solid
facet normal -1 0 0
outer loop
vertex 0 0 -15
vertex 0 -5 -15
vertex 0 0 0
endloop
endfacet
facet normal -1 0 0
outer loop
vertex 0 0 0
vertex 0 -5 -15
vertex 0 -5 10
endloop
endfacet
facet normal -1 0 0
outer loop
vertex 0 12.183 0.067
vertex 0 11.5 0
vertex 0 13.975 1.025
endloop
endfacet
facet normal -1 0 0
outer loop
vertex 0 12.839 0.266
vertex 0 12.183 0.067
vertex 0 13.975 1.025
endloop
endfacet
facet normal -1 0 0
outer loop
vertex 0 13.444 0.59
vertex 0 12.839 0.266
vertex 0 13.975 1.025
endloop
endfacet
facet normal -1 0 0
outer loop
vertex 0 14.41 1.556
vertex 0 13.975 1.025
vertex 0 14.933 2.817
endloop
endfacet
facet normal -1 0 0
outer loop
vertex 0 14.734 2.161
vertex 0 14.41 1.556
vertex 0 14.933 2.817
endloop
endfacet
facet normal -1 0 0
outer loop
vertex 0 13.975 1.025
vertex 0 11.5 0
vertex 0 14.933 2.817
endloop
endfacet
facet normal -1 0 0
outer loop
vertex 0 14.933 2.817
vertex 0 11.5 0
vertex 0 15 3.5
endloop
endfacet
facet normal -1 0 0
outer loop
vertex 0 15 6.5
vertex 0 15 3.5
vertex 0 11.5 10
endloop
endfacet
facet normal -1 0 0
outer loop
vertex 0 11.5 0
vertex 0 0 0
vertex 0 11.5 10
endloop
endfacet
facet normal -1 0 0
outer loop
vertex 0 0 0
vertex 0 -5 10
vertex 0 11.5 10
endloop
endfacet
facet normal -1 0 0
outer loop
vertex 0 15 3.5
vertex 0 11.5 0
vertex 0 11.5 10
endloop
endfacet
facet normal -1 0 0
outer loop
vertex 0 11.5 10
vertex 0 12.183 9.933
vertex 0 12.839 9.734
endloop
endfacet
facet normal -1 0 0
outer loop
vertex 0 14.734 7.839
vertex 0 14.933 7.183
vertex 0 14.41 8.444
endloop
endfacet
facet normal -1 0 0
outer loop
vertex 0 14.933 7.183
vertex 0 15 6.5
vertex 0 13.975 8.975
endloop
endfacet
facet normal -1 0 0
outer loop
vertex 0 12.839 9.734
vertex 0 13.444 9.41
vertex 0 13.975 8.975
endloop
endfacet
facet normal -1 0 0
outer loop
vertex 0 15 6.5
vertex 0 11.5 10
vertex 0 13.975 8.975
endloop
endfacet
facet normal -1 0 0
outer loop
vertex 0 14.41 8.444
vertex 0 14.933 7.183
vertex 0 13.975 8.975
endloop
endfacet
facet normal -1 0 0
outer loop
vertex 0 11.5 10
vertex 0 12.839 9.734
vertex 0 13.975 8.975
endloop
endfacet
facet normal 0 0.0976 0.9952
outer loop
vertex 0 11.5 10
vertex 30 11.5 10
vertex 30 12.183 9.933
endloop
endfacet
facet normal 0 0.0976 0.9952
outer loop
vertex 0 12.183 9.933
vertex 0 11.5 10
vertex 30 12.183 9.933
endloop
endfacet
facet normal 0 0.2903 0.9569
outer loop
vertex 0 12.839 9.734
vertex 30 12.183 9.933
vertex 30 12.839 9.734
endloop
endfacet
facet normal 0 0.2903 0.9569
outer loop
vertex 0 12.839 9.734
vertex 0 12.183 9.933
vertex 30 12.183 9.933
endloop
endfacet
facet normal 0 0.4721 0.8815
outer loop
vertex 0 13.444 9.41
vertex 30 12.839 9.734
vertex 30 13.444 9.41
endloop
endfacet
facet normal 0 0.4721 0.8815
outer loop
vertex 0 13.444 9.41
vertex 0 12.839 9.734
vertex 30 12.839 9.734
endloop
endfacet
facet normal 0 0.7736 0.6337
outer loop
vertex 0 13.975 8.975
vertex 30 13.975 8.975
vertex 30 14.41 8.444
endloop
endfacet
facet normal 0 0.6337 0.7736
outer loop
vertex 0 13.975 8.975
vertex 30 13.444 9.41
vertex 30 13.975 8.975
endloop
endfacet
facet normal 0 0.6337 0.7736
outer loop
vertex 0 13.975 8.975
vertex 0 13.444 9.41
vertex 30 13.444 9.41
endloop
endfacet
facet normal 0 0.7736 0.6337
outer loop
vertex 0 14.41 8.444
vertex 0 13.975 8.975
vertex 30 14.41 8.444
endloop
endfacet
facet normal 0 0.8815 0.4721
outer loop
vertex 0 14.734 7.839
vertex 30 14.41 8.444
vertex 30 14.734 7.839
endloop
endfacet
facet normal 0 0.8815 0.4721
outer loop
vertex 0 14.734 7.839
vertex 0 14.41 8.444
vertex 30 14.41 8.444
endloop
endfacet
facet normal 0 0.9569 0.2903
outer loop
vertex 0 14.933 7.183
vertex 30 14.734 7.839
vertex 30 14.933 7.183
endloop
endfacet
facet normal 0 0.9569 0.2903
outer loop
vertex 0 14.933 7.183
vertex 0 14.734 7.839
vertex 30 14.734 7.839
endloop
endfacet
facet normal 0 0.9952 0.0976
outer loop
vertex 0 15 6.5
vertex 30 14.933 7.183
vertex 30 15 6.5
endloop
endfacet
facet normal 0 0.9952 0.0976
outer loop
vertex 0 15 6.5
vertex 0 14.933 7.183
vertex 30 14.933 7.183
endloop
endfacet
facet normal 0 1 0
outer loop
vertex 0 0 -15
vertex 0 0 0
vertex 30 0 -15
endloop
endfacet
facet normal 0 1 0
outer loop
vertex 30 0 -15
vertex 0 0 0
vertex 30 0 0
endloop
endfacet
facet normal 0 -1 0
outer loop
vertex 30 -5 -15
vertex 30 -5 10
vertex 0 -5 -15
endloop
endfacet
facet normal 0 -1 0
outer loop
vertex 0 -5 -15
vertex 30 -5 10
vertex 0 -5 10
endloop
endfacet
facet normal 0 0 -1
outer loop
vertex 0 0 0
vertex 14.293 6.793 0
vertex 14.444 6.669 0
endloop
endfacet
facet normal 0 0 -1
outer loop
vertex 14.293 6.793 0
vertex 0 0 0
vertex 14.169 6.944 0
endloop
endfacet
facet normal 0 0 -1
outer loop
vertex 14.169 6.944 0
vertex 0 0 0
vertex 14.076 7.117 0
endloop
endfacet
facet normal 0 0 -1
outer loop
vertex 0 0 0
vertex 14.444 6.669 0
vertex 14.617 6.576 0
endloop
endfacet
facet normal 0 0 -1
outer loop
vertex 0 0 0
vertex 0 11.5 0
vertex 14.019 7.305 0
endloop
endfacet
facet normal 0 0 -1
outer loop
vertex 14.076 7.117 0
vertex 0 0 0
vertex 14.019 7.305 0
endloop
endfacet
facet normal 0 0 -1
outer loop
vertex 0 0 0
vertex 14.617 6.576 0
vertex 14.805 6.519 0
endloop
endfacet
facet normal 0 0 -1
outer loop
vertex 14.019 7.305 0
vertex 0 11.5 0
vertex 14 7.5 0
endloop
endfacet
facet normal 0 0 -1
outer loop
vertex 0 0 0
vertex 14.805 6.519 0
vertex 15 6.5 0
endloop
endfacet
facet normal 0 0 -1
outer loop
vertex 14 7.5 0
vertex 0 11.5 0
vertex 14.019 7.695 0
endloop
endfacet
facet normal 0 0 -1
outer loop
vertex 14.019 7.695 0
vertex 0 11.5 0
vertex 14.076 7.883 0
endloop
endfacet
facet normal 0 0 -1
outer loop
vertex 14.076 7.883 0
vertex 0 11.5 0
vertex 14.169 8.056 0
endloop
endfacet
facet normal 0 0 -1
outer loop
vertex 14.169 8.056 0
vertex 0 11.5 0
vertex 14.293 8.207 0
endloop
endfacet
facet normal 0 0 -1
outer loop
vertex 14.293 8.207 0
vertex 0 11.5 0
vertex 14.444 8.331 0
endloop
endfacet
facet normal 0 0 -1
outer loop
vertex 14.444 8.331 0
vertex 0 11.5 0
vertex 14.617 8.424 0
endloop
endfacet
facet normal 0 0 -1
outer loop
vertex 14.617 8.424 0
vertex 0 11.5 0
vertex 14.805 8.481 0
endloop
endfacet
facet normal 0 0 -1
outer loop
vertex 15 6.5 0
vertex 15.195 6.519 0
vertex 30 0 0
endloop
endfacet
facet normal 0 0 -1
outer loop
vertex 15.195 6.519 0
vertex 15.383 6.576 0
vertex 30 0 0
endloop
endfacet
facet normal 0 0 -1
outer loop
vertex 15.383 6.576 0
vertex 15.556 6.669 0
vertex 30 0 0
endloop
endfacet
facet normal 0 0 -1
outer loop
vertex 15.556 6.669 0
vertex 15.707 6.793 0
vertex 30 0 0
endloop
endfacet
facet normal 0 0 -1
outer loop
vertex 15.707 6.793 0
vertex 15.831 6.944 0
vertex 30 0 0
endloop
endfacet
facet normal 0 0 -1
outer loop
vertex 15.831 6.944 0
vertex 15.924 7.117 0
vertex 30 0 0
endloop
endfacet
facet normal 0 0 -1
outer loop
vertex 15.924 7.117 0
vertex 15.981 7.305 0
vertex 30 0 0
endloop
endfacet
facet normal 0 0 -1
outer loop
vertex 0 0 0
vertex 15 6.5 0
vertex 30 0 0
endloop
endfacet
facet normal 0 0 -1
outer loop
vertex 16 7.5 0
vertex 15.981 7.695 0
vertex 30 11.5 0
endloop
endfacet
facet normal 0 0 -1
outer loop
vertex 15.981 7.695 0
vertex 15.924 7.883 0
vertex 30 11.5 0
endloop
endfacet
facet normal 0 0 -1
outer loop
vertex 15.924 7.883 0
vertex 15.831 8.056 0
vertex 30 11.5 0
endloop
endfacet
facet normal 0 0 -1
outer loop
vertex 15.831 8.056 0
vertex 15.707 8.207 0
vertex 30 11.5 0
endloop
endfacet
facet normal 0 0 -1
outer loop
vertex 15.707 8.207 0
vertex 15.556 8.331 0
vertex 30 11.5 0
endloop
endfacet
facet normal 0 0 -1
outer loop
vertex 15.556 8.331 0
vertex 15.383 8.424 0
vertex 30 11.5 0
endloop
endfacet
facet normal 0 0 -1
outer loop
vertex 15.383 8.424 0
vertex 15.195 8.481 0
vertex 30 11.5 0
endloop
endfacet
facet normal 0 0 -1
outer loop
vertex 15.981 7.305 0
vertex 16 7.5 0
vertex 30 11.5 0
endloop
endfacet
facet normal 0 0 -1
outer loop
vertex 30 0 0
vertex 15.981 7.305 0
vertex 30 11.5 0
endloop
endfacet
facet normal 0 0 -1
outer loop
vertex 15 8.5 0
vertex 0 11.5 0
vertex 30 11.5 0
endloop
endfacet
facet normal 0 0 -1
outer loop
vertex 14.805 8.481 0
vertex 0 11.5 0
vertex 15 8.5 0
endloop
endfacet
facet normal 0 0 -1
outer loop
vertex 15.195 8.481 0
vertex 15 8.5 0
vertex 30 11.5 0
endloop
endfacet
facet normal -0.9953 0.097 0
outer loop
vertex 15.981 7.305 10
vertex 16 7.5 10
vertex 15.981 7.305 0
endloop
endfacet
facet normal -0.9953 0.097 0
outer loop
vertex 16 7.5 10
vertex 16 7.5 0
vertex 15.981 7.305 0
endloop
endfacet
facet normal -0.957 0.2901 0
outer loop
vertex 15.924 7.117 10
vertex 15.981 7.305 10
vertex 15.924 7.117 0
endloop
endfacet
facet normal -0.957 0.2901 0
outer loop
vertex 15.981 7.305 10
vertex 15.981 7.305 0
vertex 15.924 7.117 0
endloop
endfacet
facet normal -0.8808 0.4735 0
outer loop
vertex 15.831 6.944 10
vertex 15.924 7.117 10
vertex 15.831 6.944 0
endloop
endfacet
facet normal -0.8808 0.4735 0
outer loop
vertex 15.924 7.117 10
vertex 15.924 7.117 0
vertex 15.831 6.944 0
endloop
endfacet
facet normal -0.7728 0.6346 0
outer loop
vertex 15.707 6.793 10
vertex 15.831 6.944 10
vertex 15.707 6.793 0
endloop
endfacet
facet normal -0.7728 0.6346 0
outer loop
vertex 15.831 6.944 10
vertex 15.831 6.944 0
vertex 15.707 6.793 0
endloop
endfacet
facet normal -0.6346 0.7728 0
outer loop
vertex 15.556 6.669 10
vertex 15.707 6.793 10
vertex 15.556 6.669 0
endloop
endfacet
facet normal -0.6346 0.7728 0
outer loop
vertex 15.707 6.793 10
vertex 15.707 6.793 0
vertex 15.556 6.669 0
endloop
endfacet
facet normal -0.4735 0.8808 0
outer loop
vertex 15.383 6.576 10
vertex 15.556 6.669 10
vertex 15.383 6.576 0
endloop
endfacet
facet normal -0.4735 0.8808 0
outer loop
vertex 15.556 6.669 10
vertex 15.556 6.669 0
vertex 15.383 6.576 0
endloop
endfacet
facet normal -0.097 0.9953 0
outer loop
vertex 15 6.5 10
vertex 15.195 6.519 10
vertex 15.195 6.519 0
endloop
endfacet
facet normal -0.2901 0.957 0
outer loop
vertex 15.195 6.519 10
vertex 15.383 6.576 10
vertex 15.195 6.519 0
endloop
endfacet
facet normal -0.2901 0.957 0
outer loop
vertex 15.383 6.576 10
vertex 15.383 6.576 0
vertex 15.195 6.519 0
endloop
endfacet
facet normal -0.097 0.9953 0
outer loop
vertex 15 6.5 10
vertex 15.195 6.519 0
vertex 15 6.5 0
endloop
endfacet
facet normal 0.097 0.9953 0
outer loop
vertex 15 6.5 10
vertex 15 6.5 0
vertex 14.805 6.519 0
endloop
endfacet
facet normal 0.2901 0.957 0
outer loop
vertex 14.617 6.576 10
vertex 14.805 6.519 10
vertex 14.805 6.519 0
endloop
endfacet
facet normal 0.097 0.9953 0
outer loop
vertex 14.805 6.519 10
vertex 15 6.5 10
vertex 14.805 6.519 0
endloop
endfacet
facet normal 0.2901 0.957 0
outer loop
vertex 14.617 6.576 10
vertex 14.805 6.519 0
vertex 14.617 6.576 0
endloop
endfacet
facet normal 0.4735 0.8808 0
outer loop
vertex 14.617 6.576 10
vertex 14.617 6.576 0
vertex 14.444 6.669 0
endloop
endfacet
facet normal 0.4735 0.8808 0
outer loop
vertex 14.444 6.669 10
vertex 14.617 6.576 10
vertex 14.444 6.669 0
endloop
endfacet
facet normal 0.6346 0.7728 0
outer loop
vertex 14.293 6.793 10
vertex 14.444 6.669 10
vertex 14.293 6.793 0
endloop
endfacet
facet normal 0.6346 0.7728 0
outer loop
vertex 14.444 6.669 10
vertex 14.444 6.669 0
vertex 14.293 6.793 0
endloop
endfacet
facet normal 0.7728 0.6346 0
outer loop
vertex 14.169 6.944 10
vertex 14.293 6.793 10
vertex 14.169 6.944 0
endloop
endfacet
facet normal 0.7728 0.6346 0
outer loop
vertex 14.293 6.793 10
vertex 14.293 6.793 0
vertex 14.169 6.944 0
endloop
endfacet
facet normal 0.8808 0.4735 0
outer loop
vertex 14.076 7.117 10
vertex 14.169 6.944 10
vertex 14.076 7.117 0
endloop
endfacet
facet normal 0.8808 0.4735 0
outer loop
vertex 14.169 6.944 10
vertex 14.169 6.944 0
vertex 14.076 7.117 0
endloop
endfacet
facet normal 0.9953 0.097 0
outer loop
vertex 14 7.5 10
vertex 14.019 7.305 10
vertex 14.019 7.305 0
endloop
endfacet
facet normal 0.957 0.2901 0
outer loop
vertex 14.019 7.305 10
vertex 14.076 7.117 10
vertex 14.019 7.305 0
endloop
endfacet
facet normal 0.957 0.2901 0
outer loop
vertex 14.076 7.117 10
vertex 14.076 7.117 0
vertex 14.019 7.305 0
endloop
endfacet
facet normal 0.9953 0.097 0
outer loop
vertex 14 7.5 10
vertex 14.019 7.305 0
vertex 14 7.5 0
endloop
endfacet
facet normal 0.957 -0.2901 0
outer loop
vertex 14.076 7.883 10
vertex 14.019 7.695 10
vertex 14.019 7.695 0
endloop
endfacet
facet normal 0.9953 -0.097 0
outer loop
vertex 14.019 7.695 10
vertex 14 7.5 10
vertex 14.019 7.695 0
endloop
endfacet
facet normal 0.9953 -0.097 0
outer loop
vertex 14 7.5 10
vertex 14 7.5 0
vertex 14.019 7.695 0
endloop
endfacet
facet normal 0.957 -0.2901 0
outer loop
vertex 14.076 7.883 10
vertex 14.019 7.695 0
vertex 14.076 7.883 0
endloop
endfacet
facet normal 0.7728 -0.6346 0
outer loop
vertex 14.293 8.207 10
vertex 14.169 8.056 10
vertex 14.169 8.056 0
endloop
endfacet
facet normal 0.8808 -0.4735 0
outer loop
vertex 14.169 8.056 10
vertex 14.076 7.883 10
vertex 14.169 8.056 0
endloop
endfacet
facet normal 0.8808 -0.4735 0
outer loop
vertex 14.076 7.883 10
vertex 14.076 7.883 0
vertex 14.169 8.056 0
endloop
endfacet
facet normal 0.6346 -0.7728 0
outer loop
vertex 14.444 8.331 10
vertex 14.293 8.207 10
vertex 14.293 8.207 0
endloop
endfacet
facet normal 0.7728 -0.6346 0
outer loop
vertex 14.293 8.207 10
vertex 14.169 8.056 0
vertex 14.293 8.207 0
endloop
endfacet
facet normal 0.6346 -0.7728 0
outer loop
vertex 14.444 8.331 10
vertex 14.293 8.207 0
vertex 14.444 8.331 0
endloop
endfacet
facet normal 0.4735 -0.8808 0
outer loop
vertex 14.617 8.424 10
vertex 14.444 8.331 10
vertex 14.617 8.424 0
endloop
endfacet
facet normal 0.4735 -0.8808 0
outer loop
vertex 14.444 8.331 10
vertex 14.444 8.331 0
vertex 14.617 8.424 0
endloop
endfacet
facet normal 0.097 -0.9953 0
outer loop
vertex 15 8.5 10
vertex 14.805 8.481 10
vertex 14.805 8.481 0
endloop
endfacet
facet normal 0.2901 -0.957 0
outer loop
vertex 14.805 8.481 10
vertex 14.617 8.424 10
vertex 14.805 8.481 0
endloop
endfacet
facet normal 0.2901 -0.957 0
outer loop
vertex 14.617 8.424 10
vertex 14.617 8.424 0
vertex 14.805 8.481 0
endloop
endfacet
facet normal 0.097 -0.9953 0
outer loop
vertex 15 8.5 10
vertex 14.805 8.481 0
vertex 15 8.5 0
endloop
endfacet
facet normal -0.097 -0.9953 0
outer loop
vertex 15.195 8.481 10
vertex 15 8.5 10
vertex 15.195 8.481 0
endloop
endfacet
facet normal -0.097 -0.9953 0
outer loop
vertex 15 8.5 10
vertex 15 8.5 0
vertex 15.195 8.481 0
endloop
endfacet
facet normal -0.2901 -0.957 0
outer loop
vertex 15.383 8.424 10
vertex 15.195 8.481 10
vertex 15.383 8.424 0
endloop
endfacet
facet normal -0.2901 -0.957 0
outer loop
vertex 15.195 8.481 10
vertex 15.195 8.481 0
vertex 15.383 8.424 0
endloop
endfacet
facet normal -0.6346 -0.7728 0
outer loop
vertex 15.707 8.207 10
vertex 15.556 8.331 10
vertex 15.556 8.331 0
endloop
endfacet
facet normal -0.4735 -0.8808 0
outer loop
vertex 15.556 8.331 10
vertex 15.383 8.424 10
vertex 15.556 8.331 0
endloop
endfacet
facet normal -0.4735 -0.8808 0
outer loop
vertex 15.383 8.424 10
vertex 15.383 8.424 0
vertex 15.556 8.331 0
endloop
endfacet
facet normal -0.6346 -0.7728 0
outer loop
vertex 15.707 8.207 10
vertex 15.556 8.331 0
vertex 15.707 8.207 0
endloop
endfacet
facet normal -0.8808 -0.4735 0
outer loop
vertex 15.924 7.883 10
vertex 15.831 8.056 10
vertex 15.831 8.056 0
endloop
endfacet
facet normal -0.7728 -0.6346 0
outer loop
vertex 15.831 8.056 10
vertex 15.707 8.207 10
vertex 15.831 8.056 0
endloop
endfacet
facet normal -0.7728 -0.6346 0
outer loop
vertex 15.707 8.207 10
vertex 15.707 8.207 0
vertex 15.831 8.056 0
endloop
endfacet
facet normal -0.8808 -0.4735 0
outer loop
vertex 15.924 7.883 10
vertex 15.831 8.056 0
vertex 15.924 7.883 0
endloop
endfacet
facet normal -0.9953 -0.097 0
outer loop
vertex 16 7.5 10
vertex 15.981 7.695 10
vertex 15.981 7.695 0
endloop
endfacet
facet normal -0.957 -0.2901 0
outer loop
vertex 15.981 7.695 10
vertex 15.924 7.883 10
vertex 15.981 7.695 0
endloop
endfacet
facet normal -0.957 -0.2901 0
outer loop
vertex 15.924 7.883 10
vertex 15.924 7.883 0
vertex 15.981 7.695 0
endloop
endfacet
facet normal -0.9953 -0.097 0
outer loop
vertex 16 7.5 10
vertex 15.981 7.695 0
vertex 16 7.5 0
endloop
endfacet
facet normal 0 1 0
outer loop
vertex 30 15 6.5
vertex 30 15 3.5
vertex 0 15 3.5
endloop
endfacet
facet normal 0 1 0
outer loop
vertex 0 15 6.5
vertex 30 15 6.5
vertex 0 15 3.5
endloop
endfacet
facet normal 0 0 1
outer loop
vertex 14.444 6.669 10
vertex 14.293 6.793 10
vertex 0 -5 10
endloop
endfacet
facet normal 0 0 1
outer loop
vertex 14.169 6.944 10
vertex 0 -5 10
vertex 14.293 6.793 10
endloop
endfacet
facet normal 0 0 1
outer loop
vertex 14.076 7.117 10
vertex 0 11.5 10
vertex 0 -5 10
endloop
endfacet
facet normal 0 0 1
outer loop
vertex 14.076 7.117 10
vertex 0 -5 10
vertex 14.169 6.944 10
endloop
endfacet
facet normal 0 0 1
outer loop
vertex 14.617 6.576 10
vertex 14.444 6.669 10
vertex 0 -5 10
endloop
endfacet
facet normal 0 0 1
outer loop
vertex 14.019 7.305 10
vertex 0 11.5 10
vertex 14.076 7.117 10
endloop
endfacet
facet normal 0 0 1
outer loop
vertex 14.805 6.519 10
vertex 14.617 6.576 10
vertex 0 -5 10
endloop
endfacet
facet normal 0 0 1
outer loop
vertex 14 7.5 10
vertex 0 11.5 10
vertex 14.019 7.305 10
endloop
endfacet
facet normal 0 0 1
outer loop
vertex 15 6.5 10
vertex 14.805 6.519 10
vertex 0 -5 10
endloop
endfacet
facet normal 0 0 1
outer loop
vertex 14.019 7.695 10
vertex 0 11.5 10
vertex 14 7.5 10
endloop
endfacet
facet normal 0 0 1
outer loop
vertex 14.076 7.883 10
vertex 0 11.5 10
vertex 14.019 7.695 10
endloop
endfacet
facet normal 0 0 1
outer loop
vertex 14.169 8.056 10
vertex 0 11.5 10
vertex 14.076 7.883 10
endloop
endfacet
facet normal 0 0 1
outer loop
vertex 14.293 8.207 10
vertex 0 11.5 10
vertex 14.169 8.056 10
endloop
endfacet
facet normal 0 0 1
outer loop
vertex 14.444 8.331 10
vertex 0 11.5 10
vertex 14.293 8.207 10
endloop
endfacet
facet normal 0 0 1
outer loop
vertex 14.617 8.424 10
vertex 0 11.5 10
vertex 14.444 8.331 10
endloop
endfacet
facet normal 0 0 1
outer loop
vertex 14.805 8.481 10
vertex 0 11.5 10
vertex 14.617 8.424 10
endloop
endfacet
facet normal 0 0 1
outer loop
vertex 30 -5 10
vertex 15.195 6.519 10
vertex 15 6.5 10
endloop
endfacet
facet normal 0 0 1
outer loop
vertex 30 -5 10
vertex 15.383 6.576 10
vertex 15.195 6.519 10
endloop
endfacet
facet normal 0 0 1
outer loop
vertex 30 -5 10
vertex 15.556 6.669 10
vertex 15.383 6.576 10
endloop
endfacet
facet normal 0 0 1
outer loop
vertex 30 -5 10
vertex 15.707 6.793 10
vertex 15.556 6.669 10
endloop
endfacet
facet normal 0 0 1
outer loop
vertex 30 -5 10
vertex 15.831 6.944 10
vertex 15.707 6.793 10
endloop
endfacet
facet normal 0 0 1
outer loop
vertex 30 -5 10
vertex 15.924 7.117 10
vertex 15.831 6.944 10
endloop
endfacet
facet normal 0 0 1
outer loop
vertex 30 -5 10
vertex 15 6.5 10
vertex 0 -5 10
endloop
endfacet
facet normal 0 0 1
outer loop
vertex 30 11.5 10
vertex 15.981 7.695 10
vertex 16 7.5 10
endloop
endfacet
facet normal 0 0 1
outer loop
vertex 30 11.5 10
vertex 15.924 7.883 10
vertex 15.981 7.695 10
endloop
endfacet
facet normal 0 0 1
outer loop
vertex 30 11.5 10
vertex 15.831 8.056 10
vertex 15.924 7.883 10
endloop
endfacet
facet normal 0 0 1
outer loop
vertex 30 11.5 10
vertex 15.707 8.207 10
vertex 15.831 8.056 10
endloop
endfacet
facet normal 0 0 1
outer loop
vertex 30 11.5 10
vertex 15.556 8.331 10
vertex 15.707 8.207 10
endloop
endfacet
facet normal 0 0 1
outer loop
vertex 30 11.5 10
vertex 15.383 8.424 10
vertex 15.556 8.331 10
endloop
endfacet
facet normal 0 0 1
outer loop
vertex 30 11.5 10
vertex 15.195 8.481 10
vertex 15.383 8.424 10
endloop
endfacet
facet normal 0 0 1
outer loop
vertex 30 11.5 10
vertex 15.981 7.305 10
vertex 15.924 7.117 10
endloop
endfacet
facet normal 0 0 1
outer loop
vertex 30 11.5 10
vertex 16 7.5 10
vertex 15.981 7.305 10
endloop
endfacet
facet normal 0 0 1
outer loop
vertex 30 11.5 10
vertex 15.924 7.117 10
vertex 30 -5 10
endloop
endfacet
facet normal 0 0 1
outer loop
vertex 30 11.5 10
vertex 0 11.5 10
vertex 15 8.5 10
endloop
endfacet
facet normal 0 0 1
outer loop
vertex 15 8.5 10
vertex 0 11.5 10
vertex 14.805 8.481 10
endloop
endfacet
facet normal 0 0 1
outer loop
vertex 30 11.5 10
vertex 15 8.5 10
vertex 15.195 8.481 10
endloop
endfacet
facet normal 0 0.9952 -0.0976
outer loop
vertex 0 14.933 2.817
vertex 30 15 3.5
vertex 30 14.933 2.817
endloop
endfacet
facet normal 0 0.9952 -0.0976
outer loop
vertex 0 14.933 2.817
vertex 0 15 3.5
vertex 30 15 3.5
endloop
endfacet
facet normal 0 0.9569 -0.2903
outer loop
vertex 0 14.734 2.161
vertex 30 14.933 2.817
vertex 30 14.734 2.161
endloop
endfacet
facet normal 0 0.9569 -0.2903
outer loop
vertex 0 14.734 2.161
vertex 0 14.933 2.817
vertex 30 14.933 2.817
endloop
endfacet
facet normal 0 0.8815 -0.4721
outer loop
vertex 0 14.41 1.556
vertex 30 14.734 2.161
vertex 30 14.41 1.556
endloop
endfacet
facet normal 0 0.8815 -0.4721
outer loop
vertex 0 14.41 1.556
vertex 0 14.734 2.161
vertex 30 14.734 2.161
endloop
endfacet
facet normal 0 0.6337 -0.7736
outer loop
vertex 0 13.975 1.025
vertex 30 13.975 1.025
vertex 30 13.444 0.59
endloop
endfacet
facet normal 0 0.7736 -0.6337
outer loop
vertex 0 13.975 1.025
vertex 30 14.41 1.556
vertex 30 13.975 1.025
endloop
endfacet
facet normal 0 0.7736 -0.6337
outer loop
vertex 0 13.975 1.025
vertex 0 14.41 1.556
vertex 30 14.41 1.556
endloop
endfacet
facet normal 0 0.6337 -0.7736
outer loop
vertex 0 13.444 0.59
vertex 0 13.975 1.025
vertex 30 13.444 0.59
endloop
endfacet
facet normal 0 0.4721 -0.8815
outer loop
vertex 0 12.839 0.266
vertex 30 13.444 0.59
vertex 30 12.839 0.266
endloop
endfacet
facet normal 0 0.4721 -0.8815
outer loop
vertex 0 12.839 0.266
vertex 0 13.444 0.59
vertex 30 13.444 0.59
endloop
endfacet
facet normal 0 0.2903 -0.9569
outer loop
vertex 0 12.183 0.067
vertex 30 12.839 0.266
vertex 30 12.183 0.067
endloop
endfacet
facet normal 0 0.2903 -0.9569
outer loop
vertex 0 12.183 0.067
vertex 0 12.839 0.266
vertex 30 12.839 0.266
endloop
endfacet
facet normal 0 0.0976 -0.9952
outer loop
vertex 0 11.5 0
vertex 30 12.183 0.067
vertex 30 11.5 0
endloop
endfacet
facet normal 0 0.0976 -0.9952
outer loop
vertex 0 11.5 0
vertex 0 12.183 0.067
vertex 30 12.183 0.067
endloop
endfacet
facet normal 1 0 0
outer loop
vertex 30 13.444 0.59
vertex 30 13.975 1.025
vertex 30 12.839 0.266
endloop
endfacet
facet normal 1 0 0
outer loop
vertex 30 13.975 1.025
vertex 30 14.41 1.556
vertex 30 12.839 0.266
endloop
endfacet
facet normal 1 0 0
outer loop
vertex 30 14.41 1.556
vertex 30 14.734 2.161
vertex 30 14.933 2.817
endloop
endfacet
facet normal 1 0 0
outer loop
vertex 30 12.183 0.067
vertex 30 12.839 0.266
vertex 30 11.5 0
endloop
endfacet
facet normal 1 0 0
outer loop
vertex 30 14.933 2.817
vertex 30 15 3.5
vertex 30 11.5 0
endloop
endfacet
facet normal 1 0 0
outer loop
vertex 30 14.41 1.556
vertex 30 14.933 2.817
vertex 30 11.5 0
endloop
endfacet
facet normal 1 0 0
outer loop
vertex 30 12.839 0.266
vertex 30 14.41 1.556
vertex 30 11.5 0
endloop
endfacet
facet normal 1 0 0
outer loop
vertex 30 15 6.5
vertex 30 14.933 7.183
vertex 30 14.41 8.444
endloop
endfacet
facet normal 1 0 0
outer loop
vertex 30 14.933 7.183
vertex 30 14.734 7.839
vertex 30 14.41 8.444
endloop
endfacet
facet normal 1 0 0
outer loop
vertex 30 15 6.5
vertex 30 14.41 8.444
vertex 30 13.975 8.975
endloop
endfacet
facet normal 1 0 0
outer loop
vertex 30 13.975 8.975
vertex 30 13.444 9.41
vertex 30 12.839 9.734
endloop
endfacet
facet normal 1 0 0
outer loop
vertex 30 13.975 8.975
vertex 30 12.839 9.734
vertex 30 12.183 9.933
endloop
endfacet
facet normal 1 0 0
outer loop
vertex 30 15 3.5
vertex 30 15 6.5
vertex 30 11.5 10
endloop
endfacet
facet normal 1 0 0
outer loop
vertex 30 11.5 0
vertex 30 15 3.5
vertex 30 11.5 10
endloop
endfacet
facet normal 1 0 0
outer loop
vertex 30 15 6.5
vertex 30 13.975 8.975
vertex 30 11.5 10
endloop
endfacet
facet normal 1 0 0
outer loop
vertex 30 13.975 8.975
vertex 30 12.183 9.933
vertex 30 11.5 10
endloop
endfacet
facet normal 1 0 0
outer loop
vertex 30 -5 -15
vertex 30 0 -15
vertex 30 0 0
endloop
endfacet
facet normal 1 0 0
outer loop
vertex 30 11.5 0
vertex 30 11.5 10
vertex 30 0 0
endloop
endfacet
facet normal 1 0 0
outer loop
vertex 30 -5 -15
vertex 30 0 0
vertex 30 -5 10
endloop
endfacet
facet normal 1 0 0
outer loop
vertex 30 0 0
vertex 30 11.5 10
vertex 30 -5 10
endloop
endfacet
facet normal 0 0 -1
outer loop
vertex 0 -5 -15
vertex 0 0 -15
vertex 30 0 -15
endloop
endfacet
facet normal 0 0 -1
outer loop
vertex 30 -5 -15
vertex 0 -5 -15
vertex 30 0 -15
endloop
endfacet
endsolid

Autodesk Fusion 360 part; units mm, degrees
sketch "Sketch1" plane through (0, 0, 0) normal (0, 0, 1) x (1, 0, 0)
  line L0 (0, 0) -> (30, 0)
  line L1 (30, 0) -> (30, 15)
  line L2 (30, 15) -> (0, 15)
  line L3 (0, 15) -> (0, 0)
  circle A0 centre (15, 7.5) radius 1
  line L4 (0, 0) -> (30, 0)
  line L5 (30, 0) -> (30, -5)
  line L6 (30, -5) -> (0, -5)
  line L7 (0, -5) -> (0, 0)
  dimension "d1" = 30
  dimension "d2" = 15
  dimension "d3" = 2
  dimension "d4" = 7.5
  dimension "d5" = 15
  dimension "d6" = 5
extrude "Extrude1" add sketch "Sketch1" along normal blind 10
extrude "Extrude2" add sketch "Sketch1" against normal blind 15 contours L0 L4 L5 L6 L7
fillet "Fillet1" radius 3.5 2 edges at (15, 15, 10) (15, 15, 0)
